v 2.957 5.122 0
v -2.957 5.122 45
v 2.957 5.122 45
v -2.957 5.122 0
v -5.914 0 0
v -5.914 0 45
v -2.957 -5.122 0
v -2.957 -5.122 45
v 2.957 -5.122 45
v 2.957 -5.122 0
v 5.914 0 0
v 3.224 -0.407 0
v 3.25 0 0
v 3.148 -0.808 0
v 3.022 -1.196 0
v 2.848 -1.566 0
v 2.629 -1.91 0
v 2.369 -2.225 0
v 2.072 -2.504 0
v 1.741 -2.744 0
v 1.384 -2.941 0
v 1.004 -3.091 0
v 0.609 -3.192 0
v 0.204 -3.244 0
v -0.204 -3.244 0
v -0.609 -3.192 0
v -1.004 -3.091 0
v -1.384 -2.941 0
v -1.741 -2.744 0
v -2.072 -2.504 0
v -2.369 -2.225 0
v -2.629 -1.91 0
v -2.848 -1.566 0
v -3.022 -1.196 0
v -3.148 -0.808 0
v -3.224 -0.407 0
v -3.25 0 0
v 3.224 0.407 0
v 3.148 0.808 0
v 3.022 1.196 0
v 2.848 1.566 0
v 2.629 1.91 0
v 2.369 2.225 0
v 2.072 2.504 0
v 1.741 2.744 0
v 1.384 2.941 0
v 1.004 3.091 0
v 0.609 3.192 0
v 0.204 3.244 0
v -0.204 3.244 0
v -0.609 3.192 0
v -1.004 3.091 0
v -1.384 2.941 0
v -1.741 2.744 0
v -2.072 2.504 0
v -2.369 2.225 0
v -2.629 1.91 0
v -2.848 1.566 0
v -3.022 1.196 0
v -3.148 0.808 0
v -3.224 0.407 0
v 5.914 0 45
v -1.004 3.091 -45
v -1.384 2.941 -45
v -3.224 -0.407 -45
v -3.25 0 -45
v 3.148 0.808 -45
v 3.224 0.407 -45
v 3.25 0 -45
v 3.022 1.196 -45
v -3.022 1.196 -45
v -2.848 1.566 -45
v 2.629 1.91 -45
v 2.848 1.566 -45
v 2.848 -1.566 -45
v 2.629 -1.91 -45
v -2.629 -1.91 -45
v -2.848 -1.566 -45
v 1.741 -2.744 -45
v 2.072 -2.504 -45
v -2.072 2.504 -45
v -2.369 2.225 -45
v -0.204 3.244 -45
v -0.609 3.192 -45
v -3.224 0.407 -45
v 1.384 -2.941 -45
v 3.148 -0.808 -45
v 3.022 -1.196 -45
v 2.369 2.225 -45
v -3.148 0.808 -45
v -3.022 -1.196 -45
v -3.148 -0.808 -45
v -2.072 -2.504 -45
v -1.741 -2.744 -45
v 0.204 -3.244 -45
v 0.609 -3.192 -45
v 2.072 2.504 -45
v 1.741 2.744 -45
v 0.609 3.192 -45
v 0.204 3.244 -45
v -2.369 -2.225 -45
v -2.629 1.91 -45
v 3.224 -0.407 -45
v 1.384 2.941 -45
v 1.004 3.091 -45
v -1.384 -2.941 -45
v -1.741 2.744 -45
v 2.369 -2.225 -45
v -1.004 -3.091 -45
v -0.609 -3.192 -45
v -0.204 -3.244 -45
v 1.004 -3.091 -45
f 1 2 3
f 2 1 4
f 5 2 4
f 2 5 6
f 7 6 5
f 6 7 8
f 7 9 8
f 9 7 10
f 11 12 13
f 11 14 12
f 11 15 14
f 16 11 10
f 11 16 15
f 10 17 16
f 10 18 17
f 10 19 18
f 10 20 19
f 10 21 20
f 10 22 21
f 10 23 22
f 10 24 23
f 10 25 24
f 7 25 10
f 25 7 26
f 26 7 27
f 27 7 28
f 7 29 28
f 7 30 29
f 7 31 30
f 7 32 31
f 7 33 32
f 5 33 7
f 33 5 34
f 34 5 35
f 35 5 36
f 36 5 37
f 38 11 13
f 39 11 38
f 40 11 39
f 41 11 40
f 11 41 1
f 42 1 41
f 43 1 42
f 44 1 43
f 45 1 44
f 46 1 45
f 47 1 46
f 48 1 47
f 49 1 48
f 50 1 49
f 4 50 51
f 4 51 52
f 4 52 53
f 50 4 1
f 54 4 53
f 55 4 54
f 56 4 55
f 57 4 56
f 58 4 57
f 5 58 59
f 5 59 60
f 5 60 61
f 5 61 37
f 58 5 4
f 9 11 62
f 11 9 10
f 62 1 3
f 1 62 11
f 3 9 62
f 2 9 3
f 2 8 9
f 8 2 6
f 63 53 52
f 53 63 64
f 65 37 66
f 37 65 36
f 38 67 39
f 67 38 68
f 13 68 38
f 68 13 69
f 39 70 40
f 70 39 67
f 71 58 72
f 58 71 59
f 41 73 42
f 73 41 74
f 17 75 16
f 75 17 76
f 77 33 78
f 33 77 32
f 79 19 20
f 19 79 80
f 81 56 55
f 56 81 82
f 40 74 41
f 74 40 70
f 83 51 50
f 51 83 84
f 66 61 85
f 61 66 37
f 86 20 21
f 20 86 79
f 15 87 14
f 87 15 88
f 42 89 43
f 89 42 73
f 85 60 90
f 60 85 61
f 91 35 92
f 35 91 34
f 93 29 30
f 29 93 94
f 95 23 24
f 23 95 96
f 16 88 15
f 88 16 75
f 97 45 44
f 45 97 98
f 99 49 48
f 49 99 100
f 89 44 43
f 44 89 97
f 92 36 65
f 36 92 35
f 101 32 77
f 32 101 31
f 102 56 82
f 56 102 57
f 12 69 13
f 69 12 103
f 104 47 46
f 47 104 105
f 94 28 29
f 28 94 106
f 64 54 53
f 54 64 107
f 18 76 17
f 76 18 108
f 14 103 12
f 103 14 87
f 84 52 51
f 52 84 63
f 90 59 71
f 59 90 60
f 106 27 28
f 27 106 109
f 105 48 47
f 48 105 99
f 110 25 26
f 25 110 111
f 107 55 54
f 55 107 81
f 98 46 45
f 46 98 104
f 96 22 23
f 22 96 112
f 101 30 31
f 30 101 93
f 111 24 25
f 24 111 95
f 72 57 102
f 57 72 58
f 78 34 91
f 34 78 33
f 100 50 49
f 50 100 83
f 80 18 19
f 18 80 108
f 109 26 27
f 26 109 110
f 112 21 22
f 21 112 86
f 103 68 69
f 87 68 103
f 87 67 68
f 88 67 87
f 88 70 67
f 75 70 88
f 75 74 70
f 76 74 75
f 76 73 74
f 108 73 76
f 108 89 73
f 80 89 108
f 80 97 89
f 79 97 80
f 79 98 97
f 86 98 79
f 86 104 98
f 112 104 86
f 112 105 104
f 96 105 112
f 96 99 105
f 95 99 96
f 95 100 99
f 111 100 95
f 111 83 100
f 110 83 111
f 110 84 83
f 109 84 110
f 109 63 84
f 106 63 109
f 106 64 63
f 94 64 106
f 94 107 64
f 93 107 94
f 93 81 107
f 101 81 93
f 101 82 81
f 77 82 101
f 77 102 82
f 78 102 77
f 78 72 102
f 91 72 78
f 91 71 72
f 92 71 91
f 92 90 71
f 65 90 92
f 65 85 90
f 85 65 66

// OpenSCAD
$fn = 50;


difference() {
	union() {
		linear_extrude(height = 45) {
			polygon(points = [[5.9142500000, 0.0000000000], [2.9571250000, 5.1218907443], [-2.9571250000, 5.1218907443], [-5.9142500000, 0.0000000000], [-2.9571250000, -5.1218907443], [2.9571250000, -5.1218907443]]);
		}
		translate(v = [0, 0, -45]) {
			cylinder(h = 45, r = 3.2500000000);
		}
	}
	union();
}
